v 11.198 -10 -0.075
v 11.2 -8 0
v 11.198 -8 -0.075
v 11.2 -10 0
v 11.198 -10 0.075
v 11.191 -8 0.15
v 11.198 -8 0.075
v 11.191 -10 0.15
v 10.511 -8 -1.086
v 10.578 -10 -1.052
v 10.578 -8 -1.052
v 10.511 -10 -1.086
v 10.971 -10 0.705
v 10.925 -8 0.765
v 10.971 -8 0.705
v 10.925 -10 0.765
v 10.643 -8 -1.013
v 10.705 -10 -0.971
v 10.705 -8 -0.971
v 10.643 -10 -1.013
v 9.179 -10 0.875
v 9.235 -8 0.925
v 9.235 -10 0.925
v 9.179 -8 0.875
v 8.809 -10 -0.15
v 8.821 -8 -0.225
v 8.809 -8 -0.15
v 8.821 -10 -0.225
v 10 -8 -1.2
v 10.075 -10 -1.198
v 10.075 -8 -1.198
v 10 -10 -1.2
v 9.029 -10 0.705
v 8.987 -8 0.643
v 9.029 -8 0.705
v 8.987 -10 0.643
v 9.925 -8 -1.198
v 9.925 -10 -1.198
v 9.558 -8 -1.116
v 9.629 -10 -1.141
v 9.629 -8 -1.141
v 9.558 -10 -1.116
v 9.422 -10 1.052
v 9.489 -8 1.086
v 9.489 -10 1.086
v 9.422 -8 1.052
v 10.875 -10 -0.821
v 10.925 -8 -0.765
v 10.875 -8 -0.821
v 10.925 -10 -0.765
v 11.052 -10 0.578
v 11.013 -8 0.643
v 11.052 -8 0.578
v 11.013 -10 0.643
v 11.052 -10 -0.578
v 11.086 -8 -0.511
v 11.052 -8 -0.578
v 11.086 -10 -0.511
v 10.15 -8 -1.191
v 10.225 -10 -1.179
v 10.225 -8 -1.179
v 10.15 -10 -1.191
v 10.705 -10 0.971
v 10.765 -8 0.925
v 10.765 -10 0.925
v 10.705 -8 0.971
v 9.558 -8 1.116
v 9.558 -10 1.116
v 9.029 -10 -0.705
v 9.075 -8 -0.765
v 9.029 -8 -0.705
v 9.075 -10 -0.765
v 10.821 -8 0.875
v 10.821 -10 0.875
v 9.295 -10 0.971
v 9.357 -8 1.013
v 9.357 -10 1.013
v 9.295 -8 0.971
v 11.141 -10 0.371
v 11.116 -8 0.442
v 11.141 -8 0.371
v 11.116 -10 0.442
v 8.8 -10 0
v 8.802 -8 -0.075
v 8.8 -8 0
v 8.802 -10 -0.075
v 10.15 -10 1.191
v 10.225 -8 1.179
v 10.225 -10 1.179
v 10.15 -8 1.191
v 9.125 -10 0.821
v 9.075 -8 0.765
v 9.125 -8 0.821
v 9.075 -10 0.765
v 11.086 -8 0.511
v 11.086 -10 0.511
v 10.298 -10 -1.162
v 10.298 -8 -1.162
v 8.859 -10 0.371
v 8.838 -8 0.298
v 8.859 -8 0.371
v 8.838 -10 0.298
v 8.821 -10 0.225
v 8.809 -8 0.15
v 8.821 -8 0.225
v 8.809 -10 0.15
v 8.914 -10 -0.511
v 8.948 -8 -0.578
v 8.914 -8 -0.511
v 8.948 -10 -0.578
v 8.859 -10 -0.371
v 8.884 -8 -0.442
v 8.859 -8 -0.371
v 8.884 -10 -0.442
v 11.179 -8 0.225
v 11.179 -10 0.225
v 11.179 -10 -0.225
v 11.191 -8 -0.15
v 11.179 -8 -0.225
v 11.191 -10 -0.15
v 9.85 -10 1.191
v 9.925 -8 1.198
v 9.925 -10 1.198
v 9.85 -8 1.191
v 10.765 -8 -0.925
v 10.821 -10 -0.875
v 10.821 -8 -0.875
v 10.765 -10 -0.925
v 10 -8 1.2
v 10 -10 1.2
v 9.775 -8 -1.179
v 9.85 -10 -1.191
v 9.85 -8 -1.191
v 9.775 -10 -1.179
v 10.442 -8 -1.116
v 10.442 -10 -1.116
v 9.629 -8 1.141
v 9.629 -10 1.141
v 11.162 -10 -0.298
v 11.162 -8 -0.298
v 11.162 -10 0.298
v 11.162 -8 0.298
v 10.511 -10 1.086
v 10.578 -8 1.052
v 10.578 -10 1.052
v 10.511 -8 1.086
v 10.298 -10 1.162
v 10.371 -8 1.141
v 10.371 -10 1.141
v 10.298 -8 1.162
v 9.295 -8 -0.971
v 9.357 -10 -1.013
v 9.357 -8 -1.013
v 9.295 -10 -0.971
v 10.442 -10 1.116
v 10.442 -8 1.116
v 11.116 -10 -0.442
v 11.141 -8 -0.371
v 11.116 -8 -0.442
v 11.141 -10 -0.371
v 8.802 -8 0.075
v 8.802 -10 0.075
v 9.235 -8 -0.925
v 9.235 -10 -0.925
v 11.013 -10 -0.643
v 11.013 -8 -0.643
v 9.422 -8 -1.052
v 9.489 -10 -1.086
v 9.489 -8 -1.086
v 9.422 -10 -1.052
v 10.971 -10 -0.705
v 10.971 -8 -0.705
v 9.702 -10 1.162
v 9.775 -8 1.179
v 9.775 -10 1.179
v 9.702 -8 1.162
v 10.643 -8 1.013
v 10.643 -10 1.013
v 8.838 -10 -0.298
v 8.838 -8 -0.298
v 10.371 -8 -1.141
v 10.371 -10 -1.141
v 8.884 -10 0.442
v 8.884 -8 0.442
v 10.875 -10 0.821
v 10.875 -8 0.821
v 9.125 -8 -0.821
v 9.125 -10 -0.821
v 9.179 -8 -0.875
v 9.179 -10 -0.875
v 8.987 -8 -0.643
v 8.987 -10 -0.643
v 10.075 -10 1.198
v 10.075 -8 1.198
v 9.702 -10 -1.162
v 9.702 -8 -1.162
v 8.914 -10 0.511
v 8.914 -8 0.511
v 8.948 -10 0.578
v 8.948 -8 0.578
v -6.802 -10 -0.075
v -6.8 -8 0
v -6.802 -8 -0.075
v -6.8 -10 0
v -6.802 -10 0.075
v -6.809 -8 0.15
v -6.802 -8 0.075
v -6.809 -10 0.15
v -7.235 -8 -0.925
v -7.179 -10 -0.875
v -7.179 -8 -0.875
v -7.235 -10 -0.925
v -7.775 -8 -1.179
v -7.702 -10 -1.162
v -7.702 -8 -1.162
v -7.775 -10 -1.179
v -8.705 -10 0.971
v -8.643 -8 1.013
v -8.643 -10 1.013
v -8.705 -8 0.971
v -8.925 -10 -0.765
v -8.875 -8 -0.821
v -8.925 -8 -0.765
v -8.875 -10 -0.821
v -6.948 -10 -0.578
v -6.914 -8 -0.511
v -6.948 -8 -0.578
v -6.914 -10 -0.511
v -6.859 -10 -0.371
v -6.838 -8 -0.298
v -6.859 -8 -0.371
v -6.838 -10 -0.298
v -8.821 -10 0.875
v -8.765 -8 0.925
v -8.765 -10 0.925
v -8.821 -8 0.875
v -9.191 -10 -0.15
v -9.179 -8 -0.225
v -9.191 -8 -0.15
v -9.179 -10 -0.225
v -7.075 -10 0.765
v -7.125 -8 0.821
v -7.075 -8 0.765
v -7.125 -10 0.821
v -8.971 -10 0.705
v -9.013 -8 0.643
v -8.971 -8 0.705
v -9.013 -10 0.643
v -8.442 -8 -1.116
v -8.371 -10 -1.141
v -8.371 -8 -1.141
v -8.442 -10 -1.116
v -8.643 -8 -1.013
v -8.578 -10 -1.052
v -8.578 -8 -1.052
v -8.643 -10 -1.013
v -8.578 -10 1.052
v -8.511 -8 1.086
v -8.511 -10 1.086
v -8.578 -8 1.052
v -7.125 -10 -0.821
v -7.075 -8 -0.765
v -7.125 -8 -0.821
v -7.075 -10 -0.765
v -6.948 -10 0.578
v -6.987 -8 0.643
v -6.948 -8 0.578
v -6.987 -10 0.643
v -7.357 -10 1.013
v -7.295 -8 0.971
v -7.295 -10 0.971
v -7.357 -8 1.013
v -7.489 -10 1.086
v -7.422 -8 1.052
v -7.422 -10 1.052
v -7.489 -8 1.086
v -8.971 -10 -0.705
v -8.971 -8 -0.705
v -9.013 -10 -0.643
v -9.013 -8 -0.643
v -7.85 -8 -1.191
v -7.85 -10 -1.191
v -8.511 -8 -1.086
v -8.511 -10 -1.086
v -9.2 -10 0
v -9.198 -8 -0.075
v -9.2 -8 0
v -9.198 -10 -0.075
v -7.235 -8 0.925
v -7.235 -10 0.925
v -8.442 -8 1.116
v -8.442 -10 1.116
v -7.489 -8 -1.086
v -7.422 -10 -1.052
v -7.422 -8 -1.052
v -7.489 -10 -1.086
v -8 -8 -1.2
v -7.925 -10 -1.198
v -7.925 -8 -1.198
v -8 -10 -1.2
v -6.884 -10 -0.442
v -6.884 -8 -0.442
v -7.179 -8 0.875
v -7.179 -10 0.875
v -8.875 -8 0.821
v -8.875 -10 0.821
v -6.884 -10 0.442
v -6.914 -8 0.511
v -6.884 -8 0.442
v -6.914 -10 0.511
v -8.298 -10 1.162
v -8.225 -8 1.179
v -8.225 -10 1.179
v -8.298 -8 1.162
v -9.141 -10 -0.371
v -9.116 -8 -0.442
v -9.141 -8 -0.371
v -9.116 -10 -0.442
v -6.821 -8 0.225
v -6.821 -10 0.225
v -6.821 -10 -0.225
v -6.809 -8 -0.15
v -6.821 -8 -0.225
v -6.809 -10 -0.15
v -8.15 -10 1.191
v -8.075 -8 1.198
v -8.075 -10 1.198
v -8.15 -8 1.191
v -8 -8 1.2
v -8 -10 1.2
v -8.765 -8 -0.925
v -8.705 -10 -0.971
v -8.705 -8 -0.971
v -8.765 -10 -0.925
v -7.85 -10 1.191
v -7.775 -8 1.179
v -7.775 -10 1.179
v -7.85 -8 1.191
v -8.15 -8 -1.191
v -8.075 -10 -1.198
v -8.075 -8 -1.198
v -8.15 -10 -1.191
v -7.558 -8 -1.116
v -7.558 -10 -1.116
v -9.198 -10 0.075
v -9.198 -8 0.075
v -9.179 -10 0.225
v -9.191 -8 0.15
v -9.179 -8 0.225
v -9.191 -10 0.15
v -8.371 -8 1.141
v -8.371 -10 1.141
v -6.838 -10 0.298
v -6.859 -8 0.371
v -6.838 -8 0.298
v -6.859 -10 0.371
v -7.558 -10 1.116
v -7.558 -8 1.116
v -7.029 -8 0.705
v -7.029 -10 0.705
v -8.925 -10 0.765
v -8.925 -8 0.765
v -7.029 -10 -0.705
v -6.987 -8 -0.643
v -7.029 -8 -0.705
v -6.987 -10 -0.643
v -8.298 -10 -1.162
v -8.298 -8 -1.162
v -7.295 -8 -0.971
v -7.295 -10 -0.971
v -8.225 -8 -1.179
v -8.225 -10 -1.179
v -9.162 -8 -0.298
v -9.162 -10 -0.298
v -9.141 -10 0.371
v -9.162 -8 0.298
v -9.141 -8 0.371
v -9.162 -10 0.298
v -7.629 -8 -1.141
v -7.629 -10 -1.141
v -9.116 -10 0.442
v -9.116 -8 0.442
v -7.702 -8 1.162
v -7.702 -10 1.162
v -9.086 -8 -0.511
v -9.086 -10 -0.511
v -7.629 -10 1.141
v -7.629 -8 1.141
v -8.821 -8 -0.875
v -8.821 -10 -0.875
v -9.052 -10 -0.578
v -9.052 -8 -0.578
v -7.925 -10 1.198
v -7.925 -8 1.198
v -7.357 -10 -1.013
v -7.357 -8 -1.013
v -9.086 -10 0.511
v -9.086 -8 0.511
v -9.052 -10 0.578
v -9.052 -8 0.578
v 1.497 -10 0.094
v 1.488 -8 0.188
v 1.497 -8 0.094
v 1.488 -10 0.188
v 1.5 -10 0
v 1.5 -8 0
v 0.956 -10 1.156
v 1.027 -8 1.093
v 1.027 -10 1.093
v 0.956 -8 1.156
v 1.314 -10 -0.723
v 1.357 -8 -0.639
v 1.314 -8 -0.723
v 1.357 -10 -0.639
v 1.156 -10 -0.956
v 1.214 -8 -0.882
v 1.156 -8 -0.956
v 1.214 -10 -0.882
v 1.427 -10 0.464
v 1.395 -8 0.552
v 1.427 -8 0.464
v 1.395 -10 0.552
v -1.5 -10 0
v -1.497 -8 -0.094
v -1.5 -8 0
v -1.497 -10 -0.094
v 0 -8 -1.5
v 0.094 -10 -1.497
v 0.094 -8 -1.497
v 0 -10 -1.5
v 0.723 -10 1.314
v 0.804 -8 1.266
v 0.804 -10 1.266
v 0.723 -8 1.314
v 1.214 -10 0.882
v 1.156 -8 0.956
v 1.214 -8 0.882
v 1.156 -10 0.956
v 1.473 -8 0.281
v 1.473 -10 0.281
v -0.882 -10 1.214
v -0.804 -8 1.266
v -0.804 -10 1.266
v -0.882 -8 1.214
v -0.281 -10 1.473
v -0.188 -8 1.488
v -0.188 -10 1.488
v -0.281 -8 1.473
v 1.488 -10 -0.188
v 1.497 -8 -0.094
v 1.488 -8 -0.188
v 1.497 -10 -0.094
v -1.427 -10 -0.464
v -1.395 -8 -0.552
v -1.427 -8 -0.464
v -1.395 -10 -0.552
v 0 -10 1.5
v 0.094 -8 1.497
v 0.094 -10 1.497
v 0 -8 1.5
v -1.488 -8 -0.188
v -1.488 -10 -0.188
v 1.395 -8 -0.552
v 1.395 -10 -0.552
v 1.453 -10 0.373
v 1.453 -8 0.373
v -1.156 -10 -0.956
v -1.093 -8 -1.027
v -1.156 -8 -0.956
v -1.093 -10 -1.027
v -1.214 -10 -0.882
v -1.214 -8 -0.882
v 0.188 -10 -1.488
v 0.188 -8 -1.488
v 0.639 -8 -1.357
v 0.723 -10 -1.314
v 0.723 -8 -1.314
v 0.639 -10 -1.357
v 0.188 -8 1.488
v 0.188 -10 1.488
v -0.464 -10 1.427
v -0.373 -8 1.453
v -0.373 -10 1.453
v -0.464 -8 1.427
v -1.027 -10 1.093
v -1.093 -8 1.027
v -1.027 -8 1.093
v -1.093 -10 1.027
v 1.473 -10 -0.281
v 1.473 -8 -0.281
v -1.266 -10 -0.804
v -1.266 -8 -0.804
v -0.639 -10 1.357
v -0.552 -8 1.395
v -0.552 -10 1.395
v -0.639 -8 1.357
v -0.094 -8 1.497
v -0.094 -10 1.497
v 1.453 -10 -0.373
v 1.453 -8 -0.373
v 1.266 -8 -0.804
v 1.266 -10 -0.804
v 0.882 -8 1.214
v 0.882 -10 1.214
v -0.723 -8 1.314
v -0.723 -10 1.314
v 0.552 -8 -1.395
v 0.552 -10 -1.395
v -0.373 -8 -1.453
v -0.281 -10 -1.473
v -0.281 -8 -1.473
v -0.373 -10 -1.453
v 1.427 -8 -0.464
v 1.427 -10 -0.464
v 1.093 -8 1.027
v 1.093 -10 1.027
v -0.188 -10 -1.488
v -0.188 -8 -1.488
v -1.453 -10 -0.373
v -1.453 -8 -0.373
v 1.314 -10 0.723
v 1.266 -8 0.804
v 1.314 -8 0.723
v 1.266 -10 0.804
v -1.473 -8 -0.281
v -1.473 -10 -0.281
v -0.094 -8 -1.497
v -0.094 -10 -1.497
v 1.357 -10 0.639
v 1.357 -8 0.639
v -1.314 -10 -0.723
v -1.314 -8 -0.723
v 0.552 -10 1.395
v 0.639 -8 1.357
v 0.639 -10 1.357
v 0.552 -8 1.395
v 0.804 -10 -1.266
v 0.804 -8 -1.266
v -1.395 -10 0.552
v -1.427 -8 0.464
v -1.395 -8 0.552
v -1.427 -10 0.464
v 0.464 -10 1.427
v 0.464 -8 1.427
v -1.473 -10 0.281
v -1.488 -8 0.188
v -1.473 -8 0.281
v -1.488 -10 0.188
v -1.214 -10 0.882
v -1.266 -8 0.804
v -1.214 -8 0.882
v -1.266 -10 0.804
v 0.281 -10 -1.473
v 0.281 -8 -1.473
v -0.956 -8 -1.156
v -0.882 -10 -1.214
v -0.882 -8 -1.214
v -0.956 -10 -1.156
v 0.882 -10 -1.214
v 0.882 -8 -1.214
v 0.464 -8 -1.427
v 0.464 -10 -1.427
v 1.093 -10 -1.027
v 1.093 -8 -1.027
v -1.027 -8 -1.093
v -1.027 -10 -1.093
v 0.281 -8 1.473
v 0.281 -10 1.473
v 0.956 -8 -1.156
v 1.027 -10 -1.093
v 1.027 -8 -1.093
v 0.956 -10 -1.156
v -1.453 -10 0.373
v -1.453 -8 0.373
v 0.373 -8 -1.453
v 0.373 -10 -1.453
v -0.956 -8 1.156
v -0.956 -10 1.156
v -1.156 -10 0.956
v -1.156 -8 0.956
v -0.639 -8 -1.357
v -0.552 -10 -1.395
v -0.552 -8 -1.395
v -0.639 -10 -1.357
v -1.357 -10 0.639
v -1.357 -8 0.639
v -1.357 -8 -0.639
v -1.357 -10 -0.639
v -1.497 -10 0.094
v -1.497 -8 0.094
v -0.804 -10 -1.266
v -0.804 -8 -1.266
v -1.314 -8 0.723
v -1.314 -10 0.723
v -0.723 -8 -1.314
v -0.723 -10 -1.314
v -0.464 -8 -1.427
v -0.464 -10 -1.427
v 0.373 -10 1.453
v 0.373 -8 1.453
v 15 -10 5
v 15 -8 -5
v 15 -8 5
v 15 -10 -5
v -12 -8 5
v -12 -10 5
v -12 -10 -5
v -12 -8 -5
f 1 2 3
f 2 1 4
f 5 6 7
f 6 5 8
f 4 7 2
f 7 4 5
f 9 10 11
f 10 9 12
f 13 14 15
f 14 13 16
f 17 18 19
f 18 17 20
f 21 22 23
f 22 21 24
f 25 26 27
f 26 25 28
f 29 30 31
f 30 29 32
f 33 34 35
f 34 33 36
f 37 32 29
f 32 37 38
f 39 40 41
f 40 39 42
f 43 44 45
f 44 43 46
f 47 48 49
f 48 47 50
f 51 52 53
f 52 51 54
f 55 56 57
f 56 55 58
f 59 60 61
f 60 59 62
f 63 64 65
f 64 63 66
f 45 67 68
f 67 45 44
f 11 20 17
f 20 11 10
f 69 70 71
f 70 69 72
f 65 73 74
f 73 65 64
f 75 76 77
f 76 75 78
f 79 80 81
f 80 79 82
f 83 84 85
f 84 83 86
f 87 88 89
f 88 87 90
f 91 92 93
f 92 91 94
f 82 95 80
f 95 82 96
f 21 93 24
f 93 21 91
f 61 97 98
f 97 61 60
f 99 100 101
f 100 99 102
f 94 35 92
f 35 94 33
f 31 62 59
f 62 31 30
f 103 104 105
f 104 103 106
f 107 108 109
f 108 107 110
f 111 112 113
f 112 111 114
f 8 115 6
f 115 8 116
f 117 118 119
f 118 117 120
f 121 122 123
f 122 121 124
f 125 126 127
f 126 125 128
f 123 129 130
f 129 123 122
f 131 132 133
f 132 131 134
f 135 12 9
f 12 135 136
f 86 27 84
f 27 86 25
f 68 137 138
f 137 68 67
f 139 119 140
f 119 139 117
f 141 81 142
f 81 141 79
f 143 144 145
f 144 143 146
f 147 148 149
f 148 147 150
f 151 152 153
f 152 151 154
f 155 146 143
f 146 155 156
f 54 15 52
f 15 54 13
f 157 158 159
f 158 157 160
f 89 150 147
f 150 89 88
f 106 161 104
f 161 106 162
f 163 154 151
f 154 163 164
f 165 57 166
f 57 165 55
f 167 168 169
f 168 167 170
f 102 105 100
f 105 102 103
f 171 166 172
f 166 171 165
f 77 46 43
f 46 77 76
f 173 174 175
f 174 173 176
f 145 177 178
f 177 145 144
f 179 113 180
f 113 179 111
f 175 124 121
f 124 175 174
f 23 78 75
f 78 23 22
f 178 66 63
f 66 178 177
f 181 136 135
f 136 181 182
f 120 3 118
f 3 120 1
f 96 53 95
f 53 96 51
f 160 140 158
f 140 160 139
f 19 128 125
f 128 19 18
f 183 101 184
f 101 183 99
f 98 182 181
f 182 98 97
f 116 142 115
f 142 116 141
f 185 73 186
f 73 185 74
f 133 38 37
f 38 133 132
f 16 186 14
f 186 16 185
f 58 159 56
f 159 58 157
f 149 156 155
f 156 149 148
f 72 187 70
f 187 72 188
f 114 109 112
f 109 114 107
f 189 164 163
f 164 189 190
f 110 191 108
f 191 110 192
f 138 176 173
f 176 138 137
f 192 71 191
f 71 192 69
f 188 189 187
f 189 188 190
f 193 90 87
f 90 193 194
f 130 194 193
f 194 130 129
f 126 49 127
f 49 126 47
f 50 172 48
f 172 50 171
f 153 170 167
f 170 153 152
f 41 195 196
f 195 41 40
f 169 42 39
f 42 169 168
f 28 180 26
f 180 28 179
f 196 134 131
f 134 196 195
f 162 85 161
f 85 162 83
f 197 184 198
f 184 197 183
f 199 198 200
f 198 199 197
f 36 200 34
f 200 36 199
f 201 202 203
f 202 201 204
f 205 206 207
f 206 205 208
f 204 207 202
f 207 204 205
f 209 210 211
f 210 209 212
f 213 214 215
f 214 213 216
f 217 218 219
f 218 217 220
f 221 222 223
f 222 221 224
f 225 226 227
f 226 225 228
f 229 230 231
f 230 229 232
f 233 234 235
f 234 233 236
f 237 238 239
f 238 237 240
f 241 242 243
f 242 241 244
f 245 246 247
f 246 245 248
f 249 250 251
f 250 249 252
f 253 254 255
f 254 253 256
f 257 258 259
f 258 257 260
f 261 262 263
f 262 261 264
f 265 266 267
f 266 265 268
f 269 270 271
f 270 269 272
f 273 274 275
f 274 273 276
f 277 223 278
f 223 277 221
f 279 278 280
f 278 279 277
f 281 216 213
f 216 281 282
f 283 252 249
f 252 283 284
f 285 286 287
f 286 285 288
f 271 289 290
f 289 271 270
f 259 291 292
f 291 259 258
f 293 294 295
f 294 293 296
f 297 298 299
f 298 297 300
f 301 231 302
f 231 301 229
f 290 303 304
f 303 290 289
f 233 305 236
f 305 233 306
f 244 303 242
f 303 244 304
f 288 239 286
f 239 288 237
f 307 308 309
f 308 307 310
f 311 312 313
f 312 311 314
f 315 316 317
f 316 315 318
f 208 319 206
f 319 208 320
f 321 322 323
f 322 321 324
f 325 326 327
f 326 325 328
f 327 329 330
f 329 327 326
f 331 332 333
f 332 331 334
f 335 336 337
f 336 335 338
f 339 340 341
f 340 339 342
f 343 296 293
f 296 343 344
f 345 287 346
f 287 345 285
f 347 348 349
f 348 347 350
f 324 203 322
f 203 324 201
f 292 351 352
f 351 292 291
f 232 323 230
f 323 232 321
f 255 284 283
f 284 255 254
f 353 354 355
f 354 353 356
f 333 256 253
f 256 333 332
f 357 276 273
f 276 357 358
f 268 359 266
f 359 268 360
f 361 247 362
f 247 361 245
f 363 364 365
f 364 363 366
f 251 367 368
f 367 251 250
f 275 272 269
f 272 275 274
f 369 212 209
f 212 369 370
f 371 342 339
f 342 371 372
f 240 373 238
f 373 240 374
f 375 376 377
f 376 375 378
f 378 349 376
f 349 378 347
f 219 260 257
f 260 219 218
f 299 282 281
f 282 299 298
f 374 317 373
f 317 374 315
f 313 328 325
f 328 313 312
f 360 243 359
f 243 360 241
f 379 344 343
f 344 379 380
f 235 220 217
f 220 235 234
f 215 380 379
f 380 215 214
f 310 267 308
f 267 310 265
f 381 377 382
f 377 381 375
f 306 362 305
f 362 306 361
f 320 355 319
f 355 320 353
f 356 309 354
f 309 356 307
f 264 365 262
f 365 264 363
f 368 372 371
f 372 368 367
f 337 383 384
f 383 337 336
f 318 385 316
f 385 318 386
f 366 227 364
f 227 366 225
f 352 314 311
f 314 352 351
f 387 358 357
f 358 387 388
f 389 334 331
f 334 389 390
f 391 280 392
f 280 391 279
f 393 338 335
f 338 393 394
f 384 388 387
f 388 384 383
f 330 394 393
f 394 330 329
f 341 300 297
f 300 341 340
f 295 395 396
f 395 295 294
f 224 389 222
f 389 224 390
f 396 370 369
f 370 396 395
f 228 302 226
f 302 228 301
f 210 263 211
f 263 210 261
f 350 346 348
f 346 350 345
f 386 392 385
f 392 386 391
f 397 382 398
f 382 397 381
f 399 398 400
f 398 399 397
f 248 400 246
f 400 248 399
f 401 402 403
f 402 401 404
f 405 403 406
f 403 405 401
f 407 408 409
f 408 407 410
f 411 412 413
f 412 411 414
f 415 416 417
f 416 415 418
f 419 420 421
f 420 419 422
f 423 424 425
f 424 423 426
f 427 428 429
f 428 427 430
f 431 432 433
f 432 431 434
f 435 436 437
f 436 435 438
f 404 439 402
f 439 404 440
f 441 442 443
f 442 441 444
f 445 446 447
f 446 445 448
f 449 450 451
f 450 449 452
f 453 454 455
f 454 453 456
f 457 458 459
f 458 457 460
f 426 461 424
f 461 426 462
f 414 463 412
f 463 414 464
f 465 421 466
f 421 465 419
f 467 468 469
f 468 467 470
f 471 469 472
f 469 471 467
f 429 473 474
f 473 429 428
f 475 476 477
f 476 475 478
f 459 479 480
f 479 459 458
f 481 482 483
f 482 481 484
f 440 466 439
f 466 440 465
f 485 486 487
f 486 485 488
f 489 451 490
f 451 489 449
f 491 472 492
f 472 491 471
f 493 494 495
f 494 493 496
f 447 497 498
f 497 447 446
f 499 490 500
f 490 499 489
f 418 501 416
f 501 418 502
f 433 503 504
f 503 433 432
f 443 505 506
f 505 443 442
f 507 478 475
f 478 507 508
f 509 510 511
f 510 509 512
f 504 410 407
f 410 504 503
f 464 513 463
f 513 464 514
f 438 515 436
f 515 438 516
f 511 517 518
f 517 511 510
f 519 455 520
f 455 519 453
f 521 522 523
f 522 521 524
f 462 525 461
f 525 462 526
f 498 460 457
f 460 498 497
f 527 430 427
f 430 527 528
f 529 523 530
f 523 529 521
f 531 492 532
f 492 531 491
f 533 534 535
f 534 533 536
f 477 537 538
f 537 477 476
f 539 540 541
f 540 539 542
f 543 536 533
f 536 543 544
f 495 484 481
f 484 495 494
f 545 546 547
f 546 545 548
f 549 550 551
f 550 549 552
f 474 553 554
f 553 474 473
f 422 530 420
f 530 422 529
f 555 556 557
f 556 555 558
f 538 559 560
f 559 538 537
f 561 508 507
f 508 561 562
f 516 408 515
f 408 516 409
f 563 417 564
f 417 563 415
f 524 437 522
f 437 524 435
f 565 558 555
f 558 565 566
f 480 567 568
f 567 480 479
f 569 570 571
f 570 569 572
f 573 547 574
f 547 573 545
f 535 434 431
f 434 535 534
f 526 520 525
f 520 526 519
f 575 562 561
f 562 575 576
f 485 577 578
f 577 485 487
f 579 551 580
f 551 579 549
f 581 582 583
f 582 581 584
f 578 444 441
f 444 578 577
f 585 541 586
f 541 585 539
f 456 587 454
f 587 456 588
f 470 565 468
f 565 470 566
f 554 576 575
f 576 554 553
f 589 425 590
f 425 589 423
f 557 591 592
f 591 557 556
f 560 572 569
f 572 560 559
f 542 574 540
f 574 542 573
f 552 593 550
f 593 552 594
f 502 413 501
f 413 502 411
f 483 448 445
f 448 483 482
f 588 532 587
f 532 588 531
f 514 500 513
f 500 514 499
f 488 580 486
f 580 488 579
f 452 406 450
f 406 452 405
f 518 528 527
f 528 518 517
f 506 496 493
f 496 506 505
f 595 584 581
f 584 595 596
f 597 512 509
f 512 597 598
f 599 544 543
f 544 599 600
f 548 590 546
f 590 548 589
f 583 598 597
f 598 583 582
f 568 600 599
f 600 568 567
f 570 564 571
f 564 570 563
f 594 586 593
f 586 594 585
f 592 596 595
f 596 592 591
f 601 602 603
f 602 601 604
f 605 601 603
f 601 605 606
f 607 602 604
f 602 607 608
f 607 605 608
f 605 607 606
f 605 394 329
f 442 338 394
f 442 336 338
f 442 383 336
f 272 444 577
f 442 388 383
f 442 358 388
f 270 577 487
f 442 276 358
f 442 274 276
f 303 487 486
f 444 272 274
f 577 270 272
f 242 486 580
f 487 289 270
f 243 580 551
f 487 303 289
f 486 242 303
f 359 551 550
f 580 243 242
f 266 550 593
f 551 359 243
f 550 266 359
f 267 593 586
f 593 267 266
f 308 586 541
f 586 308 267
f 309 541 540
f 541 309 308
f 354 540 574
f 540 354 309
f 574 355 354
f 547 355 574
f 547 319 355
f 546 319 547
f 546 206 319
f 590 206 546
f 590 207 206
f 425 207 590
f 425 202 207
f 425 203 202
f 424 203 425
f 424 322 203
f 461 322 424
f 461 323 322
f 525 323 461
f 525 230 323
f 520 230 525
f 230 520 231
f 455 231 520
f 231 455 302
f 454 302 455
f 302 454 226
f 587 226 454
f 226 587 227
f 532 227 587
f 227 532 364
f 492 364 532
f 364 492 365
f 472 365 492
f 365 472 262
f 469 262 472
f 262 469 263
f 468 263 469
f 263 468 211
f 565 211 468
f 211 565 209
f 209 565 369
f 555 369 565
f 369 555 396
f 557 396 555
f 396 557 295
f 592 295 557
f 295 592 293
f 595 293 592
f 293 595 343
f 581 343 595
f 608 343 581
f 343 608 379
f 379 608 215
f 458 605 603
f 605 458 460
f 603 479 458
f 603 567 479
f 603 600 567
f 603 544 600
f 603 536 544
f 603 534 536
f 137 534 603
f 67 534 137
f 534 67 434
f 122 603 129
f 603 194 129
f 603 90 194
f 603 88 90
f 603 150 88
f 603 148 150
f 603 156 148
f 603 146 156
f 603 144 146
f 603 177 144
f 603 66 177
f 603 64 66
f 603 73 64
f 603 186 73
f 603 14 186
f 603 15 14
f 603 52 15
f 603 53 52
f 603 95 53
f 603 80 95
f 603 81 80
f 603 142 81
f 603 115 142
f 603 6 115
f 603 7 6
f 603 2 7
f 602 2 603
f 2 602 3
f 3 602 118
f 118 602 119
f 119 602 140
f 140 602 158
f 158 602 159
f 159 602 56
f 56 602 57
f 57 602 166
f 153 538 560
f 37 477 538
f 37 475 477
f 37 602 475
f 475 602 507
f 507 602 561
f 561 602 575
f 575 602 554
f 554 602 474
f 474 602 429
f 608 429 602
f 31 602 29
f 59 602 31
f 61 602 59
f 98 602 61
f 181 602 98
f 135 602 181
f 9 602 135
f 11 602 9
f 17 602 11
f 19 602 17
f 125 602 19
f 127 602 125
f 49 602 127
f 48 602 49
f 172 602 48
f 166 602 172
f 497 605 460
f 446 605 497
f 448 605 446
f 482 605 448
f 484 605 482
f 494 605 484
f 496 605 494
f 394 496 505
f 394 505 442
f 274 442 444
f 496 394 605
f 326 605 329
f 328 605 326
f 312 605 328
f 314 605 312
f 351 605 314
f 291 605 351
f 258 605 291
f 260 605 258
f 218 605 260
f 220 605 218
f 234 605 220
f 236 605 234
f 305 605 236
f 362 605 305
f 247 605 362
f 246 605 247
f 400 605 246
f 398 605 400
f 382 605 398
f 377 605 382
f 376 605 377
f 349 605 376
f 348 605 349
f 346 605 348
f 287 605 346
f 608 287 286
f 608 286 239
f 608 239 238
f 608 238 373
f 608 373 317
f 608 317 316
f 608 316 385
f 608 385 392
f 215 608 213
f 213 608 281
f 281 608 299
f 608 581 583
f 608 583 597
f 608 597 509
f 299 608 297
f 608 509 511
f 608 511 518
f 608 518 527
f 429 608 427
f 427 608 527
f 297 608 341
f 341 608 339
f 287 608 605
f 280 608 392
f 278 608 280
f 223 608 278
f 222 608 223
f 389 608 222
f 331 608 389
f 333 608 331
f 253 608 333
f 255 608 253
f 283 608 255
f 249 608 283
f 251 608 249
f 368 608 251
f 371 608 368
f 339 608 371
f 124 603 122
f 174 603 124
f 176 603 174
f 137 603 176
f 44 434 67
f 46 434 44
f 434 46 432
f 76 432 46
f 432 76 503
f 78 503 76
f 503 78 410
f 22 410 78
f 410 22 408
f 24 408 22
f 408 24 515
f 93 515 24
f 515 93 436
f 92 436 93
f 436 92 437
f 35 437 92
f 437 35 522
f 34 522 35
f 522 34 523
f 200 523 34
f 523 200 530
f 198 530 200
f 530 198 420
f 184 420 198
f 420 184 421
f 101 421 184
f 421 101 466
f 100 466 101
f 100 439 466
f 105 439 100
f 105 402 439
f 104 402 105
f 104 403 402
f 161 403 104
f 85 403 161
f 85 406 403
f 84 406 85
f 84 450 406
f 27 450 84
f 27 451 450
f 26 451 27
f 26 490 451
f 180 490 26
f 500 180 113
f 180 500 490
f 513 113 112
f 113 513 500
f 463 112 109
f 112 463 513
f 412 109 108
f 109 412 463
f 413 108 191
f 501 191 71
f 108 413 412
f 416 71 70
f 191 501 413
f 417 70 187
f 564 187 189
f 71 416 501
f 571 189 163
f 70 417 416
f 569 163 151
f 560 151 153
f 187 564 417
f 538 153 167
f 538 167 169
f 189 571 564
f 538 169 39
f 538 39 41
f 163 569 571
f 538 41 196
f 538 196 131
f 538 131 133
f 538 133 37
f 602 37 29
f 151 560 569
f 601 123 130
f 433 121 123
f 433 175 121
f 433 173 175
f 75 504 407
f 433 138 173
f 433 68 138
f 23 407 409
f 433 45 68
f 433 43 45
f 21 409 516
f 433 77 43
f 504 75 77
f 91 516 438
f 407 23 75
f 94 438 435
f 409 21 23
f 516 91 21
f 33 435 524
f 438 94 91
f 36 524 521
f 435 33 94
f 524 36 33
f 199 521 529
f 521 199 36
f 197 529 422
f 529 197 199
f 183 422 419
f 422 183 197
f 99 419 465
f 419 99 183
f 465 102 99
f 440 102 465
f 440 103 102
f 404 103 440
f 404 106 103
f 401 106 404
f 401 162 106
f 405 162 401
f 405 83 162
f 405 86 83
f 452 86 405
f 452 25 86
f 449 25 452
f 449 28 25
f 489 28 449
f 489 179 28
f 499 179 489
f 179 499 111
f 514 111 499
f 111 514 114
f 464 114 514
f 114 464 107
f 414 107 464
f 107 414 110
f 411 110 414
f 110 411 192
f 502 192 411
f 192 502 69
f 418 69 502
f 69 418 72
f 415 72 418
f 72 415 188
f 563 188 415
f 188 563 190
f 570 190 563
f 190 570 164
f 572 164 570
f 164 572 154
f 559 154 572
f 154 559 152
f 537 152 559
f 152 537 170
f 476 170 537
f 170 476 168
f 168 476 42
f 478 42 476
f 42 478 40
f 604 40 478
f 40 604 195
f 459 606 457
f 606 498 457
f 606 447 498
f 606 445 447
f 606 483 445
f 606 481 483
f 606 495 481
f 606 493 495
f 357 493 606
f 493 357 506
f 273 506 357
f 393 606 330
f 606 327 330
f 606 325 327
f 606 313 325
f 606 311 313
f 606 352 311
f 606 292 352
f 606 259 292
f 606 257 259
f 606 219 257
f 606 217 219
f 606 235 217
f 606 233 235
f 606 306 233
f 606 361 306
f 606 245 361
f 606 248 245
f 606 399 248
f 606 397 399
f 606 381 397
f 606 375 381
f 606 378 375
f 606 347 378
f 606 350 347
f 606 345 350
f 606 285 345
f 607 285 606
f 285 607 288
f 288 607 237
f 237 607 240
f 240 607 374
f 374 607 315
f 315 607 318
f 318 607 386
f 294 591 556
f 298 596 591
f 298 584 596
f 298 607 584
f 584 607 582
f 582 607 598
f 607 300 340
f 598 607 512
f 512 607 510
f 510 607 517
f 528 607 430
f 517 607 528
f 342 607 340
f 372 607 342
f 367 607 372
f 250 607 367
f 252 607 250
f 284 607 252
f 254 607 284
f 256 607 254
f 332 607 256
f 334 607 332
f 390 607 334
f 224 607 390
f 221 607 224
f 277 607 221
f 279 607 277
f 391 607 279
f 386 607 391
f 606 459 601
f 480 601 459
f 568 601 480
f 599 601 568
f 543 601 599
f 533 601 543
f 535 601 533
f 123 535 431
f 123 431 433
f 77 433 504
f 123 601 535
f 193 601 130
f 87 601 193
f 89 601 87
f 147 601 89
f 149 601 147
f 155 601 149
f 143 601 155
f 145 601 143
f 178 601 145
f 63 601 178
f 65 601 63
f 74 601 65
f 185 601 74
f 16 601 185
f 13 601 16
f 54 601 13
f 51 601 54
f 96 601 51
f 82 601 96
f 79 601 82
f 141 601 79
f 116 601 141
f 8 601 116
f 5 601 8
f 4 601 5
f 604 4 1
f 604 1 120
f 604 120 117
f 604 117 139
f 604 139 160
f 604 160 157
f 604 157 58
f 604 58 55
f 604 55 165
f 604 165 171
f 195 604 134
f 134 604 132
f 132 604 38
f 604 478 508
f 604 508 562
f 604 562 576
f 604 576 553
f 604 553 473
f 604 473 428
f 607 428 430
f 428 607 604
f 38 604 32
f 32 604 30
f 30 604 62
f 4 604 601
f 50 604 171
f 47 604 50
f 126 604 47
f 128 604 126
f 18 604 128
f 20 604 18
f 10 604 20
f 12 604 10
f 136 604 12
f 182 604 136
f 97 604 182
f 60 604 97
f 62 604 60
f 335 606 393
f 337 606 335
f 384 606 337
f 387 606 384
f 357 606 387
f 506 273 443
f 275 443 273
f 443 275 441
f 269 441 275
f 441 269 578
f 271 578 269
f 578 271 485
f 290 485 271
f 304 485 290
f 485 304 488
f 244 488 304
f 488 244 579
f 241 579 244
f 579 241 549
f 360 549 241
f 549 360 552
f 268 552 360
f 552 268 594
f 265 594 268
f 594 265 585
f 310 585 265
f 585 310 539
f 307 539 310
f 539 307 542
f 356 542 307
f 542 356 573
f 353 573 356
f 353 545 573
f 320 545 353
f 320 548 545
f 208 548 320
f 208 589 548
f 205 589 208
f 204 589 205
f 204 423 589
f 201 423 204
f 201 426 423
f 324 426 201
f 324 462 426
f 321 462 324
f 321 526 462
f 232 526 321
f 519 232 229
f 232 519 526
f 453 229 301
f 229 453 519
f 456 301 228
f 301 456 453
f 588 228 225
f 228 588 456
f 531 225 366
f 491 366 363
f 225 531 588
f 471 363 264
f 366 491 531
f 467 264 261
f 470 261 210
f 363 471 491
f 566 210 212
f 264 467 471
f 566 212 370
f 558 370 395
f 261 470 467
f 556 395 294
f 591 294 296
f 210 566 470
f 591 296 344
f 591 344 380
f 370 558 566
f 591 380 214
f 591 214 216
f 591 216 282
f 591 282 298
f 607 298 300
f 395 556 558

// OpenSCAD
difference(){
	union(){
        translate([-12,-10,-5]){
            cube([27,2,10], center=false);
        }


	}
	union() {
        translate([10,20,0]){
            rotate([90,0,0]){
                color("blue")
                cylinder(h=100, r=1.2, $fn=100, center=false);
            }
        }
        translate([-8,20,0]){
            rotate([90,0,0]){
                color("blue")
                cylinder(h=100, r=1.2, $fn=100, center=false);
            }
        }
        
        translate([0,0,0]){
            rotate([90,0,0]){
                cylinder(h=18, r=1.5, $fn=100, center=false);
            }
        }        
        
	}
}
